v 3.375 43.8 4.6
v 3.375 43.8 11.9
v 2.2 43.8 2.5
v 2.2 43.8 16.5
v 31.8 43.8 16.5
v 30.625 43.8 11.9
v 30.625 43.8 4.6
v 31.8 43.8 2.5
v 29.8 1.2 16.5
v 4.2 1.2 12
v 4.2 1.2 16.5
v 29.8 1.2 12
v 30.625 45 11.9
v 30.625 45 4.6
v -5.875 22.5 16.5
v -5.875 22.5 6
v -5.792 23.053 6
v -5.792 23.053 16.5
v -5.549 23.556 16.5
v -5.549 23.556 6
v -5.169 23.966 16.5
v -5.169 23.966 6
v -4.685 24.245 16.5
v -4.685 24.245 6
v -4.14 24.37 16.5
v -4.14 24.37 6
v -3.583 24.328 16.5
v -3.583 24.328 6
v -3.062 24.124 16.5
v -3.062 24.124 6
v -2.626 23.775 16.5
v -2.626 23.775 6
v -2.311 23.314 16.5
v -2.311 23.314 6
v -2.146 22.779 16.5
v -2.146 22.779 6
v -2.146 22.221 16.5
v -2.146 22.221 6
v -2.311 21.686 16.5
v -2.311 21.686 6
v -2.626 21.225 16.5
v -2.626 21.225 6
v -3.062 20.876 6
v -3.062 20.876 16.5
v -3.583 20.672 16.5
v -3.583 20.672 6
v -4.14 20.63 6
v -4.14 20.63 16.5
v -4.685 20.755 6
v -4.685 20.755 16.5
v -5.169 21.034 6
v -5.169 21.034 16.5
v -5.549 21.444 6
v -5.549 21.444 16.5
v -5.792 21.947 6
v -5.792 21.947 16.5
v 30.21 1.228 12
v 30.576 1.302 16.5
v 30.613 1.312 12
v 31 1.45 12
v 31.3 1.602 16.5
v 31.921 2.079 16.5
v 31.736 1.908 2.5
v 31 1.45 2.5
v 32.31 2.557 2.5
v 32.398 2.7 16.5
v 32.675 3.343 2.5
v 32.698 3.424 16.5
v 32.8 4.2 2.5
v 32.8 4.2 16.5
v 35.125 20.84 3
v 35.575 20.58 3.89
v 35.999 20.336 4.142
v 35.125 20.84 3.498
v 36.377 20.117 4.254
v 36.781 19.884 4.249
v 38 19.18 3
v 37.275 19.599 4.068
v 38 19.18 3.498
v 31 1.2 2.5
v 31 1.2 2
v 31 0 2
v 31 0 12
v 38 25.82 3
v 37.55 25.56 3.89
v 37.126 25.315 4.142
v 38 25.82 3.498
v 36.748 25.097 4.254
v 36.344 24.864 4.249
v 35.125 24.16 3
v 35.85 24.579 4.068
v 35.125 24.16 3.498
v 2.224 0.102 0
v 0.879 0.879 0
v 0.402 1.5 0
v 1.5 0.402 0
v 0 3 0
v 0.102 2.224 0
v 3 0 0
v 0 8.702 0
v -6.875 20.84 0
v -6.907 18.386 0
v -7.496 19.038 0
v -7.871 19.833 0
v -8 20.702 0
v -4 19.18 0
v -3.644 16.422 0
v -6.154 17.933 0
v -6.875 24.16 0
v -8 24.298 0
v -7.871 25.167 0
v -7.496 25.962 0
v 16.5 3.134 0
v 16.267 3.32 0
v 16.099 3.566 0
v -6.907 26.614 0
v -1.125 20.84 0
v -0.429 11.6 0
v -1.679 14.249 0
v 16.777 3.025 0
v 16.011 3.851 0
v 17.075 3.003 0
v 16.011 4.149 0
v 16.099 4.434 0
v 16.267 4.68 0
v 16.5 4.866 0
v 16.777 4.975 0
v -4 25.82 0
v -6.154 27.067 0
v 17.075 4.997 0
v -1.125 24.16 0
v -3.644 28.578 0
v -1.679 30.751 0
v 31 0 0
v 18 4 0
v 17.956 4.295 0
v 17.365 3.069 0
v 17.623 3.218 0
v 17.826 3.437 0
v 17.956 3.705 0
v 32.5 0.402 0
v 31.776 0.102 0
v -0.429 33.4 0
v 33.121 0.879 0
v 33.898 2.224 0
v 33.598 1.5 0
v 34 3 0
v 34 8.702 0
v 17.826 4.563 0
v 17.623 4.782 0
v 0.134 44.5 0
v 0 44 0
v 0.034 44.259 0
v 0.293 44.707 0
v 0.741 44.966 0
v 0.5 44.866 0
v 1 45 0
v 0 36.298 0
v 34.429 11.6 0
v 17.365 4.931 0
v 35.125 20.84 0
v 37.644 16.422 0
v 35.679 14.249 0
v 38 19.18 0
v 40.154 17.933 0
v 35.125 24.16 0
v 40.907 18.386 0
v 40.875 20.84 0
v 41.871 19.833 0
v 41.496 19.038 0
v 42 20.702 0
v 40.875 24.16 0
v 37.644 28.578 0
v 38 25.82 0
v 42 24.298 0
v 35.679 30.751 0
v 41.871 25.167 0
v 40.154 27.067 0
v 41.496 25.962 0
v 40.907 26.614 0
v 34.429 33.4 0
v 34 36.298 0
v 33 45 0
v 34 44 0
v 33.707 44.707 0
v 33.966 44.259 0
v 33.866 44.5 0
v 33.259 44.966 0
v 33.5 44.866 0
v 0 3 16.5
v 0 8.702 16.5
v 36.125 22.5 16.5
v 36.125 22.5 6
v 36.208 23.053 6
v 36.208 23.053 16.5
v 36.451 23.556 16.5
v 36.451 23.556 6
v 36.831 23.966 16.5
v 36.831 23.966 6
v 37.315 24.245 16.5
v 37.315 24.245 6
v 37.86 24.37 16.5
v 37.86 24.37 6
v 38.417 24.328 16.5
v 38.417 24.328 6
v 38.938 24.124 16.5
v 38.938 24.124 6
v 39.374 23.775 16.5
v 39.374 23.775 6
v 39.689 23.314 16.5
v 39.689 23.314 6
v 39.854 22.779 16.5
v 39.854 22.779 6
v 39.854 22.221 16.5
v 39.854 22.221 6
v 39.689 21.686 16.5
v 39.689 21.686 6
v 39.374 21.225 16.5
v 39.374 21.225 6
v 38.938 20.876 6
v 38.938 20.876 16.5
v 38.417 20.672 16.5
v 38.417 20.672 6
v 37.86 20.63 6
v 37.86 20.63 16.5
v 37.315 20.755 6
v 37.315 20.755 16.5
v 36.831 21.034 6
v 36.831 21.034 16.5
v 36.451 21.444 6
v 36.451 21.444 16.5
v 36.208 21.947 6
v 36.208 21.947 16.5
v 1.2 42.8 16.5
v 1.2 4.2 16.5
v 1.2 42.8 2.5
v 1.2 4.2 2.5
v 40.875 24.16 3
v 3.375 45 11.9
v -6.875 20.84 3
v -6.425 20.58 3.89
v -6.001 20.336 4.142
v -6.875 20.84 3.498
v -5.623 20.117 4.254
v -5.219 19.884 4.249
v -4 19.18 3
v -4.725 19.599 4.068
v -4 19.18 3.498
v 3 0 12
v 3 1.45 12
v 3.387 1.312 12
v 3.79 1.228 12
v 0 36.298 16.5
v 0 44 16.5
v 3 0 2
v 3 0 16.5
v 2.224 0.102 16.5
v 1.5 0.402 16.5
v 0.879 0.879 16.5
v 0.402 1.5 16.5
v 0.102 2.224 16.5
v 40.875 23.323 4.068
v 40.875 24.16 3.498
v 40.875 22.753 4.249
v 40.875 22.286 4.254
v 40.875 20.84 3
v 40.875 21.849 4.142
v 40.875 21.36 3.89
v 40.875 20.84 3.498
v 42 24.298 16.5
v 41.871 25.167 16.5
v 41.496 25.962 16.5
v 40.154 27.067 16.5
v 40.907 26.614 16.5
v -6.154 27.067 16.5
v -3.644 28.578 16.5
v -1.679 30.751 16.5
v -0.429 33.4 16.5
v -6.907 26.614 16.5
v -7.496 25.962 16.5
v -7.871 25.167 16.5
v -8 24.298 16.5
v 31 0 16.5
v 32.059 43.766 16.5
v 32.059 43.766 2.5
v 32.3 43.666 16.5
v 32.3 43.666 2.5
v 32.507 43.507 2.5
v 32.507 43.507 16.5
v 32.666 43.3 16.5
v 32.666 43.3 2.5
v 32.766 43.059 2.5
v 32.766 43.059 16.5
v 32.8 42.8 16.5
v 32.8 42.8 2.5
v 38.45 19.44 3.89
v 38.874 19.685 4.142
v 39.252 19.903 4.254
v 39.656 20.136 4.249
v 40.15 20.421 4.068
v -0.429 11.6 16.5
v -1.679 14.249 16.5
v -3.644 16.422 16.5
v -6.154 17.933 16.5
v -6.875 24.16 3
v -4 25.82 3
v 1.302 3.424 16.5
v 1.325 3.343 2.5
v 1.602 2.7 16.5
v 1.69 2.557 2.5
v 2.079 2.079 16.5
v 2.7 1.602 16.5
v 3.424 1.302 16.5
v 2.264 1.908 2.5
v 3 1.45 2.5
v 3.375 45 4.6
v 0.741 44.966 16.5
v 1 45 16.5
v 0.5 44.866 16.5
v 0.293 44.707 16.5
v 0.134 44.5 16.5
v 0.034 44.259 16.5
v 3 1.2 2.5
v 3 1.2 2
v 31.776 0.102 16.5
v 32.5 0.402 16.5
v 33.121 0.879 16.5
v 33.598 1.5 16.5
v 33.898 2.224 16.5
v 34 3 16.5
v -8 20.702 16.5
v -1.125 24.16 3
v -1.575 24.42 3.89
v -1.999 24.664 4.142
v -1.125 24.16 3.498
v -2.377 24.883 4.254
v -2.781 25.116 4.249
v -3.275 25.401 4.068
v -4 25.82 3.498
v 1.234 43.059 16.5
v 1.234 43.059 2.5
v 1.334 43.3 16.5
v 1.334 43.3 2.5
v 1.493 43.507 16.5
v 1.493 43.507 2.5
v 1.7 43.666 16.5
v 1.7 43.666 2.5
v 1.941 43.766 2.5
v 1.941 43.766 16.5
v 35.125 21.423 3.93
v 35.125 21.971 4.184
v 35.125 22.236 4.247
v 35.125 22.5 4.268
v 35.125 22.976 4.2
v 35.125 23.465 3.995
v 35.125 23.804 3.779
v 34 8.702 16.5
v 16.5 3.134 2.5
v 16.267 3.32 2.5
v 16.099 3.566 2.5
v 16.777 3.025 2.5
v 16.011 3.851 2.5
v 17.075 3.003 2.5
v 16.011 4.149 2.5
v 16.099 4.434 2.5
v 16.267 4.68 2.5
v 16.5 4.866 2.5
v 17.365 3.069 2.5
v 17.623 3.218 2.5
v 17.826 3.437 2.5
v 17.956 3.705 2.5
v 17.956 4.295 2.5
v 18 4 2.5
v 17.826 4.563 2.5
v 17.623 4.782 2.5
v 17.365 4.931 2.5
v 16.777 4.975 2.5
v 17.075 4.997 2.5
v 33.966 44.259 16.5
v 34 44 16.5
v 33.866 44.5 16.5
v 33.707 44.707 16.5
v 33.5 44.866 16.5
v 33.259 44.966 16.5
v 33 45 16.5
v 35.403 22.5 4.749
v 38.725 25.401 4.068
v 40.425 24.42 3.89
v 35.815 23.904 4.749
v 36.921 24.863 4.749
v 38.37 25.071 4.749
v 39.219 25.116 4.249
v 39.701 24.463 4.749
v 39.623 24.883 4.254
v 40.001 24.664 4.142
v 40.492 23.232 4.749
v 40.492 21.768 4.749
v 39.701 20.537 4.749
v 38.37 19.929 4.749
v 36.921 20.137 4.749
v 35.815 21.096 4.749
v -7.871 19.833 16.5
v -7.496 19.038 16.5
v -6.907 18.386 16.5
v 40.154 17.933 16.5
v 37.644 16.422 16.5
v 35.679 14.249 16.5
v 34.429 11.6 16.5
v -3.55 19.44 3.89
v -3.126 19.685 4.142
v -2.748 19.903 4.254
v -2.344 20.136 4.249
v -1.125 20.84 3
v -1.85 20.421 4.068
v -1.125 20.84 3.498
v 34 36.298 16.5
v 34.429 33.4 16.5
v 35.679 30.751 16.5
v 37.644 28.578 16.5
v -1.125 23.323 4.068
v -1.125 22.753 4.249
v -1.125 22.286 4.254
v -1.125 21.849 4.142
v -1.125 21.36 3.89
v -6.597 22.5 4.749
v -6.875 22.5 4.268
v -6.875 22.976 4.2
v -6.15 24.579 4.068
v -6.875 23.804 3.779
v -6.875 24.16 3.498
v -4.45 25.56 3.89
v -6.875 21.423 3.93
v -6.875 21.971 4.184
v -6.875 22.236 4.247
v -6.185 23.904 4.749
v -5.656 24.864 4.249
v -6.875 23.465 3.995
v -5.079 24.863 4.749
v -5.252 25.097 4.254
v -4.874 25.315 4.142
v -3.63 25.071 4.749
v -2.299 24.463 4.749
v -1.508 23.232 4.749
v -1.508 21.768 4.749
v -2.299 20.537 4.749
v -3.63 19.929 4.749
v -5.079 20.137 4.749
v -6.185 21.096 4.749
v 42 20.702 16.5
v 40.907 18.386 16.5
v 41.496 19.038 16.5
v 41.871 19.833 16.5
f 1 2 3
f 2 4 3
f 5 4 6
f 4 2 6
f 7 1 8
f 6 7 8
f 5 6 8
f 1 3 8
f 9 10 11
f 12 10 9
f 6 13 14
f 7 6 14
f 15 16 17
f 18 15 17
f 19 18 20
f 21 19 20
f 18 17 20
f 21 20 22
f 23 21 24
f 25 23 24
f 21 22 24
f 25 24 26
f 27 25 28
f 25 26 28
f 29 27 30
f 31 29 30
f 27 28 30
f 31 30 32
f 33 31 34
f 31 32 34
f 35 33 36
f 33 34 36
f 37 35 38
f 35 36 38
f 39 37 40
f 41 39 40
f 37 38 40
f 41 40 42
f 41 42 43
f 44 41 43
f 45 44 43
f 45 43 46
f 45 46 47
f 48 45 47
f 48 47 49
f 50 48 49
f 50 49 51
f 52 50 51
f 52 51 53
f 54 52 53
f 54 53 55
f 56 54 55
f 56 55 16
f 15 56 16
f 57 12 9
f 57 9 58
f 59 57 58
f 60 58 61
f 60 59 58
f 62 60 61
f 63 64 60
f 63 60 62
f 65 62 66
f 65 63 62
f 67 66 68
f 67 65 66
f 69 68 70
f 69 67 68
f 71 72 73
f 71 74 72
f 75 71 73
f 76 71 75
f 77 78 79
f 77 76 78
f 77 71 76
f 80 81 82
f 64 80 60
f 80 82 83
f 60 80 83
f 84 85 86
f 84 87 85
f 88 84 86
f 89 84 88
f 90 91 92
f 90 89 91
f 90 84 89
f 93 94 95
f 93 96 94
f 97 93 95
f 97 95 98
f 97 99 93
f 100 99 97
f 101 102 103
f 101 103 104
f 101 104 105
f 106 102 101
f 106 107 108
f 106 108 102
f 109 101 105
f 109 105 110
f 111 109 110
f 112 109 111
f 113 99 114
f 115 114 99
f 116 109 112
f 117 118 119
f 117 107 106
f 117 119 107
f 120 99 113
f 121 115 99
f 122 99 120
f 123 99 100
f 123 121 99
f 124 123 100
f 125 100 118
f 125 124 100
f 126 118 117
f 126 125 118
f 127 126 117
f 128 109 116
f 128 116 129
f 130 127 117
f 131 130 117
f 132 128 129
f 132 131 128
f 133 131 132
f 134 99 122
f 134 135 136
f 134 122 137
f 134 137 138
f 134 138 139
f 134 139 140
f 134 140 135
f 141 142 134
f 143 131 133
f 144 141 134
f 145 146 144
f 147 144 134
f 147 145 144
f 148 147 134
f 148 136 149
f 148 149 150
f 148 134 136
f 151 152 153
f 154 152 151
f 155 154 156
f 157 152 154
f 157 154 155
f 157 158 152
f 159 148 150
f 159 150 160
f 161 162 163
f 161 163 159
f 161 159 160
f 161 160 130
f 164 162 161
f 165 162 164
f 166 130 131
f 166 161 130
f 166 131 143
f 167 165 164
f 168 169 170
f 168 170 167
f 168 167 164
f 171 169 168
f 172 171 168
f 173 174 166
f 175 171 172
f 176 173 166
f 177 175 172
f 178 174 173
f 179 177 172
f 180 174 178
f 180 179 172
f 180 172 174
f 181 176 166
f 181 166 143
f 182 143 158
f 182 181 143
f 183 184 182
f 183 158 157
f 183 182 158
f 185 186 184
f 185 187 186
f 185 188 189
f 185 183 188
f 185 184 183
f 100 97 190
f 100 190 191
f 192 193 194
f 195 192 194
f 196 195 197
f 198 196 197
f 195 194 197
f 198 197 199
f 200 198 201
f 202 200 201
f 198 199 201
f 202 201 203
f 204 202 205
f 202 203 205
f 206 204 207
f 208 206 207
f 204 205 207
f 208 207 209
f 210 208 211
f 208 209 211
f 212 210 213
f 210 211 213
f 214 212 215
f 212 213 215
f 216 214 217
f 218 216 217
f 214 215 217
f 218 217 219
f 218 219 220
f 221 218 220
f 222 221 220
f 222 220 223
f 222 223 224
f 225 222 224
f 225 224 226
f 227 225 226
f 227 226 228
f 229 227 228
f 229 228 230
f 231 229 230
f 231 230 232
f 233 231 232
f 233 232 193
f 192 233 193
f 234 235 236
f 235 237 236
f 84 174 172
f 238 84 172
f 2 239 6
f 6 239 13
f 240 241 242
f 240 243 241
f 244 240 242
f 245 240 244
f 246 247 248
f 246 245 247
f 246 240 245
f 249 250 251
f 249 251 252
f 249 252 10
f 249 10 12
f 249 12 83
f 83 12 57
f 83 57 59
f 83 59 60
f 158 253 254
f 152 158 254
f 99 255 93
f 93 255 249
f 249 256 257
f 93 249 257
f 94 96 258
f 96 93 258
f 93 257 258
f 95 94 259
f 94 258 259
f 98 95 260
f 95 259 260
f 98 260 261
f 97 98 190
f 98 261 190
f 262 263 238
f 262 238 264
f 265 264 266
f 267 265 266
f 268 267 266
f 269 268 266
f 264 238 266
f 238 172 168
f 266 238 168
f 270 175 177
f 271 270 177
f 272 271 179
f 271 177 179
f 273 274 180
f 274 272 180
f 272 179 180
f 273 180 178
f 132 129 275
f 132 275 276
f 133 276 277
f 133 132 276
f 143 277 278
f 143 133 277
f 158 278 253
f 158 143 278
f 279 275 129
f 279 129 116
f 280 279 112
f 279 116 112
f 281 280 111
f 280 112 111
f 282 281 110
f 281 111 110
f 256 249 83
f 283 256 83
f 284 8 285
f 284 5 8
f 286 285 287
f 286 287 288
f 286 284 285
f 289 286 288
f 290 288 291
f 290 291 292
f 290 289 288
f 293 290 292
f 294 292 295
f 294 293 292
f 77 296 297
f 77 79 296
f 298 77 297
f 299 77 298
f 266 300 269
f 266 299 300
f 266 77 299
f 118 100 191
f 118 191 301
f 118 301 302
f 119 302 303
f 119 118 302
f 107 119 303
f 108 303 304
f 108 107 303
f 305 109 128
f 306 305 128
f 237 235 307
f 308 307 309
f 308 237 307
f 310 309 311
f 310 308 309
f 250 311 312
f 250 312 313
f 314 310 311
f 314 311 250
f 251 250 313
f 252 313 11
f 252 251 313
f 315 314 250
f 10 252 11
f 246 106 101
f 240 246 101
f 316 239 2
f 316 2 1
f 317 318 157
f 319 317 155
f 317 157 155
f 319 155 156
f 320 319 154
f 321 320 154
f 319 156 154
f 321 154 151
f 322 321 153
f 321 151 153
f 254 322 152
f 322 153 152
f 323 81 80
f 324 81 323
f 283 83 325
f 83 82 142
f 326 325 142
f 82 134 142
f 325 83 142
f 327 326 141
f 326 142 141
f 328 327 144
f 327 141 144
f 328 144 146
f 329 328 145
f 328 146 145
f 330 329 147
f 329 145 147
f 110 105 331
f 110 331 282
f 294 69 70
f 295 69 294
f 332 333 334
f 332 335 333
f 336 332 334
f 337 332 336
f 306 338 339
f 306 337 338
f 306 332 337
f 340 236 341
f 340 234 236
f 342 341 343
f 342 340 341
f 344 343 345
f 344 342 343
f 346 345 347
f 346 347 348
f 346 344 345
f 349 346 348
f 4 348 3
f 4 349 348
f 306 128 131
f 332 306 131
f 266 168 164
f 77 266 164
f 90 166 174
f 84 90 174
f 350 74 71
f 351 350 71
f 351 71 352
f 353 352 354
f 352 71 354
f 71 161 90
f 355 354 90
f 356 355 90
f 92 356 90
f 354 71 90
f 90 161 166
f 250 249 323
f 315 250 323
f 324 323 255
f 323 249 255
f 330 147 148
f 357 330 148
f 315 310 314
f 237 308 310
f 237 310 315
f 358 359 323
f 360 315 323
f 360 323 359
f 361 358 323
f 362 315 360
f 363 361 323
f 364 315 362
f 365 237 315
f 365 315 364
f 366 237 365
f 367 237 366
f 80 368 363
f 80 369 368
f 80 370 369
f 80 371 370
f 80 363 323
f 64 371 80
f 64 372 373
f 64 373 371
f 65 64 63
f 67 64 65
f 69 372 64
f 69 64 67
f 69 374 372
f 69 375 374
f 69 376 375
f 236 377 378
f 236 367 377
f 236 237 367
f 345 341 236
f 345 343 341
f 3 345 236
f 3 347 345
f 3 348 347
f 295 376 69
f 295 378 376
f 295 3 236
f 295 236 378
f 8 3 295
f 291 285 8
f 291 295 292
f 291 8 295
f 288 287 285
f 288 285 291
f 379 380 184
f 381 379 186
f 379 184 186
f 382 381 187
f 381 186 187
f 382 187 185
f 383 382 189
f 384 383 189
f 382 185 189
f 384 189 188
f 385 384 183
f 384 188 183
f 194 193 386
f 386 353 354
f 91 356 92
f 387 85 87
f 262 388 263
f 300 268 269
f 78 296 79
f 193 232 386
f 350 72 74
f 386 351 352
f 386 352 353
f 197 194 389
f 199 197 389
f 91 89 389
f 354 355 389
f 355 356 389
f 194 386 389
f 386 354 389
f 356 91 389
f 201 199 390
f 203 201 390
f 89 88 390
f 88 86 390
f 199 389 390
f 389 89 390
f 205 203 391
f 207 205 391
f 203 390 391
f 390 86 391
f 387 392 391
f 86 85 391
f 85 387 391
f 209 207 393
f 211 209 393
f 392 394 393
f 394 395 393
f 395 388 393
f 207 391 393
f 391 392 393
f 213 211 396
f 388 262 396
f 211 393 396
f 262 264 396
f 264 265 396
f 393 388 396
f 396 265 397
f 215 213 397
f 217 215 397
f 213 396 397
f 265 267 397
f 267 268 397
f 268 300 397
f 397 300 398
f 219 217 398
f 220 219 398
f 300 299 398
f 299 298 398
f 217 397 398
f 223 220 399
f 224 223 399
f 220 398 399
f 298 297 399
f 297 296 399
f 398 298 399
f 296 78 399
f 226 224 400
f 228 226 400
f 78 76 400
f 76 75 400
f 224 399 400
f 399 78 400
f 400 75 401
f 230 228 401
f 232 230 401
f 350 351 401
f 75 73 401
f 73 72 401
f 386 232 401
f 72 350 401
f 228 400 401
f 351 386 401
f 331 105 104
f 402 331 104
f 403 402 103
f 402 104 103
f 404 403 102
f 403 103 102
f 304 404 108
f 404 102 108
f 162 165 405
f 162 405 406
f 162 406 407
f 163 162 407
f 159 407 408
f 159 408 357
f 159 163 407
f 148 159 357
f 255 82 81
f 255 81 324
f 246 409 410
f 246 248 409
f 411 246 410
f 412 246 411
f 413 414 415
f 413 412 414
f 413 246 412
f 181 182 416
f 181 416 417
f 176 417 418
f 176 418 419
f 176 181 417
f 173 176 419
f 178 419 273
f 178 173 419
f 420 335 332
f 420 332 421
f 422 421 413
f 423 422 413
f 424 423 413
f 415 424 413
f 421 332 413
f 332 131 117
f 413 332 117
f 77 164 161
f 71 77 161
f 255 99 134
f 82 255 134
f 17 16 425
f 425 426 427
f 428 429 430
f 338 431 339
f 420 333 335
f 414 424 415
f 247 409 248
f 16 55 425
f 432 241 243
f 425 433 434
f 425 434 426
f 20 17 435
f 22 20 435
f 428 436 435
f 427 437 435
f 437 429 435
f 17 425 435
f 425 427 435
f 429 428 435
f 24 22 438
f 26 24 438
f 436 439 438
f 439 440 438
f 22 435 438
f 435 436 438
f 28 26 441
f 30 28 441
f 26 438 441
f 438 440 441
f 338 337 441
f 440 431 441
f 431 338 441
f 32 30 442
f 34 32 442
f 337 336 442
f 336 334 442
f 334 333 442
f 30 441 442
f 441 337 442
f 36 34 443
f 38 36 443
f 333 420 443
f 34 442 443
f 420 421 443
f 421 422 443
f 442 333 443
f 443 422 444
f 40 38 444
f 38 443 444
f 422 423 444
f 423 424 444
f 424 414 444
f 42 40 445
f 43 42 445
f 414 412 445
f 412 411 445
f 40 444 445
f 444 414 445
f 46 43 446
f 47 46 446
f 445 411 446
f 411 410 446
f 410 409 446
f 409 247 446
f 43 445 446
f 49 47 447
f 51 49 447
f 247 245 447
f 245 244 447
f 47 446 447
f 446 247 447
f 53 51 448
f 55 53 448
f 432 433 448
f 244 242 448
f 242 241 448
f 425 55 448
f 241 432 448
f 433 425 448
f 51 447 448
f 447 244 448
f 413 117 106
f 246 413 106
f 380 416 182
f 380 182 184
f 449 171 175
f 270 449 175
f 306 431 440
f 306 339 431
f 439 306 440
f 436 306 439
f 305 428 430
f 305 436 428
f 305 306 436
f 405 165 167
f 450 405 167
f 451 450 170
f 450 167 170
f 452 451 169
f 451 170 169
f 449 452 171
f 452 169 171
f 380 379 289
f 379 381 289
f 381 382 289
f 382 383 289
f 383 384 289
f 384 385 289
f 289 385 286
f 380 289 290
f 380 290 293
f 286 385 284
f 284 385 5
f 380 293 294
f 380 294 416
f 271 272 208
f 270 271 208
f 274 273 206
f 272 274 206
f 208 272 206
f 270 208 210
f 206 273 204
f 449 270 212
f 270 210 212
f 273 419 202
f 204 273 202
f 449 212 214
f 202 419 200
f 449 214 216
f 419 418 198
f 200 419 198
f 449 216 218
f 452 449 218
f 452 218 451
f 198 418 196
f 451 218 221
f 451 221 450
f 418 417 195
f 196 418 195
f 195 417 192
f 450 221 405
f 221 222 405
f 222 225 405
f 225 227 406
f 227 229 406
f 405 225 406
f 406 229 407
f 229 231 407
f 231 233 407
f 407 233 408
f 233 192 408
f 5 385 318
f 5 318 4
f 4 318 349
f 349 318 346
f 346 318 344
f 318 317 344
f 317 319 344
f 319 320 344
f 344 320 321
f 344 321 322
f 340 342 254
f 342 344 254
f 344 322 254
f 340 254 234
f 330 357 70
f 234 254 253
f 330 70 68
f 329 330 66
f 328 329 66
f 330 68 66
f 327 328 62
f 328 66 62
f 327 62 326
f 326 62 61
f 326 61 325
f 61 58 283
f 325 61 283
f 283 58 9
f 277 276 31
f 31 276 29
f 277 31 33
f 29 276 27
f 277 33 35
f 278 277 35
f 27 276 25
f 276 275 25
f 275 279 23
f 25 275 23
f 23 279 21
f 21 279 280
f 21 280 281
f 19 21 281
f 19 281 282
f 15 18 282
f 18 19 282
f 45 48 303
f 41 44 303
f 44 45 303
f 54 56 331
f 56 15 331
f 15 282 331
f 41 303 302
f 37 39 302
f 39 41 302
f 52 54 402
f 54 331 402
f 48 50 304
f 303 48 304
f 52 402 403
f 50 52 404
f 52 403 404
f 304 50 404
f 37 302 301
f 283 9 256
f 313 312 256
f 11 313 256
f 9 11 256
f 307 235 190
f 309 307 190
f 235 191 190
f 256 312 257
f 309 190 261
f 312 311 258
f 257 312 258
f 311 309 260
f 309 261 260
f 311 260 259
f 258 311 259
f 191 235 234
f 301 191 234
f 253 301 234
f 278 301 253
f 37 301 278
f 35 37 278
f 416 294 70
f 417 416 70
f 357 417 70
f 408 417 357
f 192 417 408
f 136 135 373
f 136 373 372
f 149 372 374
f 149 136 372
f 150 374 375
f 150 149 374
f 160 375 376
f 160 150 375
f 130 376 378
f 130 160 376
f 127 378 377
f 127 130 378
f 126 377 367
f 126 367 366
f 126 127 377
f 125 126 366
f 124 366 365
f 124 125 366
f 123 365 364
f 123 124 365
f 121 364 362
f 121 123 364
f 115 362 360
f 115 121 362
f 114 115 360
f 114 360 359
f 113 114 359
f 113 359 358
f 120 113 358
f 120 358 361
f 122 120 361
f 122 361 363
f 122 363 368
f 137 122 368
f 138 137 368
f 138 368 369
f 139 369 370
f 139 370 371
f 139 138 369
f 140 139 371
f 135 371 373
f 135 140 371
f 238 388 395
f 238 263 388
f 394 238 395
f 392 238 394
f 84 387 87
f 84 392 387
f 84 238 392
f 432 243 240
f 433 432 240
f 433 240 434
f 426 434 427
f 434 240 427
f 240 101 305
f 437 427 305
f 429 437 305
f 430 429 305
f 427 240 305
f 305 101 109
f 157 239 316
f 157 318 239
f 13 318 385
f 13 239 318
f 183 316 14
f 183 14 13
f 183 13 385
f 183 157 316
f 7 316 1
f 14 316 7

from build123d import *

# Parameters (mm, degrees)
SKETCH1_W           = 34
SKETCH1_H           = 45
SKETCH1_R           = 1
BOSS_EXTRUDE1_DEPTH = 2.5
SKETCH2_W           = 34
SKETCH2_H           = 45
SKETCH2_W_2         = 31.6
SKETCH2_H_2         = 42.6
BOSS_EXTRUDE2_DEPTH = 14
SKETCH7_W           = 28
SKETCH7_H           = 10
CUT_EXTRUDE2_DEPTH  = 1.2
CUT_EXTRUDE3_REACH  = 60.764
SKETCH9_W           = 27.25
SKETCH9_H           = 7.3
SKETCH10_W          = 8
SKETCH10_H          = 8
SKETCH10_R          = 1.875
BOSS_EXTRUDE3_DEPTH = 16.5
FILLET1_R           = 10
FILLET2_R           = 3
FILLET3_R           = 1
CUT_EXTRUDE4_DEPTH  = 3
CHAMFER1_SIZE       = 3
CHAMFER1_SIZE_2     = 1.732050808


with BuildPart() as part:
    # Sketch1 → Boss-Extrude1 (new body)
    with BuildSketch(Plane.XY):
        with Locations((17, 22.5)):
            Rectangle(SKETCH1_W, SKETCH1_H)
        with Locations((17, 4)):
            Circle(SKETCH1_R, mode=Mode.SUBTRACT)
    extrude(amount=BOSS_EXTRUDE1_DEPTH)

    # Sketch2 → Boss-Extrude2 (add)
    with BuildSketch(Plane.XY.offset(2.5)):
        with Locations((17, 22.5)):
            Rectangle(SKETCH2_W, SKETCH2_H)
        with Locations((17, 22.5)):
            Rectangle(SKETCH2_W_2, SKETCH2_H_2, mode=Mode.SUBTRACT)
    extrude(amount=BOSS_EXTRUDE2_DEPTH)

    # Sketch7 → Cut-Extrude2 (cut)
    with BuildSketch(Plane(origin=(0, 0, 0), x_dir=(-1, 0, 0), z_dir=(0, -1, 0))):
        with Locations((-17, -7)):
            Rectangle(SKETCH7_W, SKETCH7_H)
    extrude(amount=-CUT_EXTRUDE2_DEPTH, mode=Mode.SUBTRACT)

    # Sketch9 → Cut-Extrude3 (cut, up to next)
    with BuildSketch(Plane(origin=(0, 45, 0), x_dir=(1, 0, 0), z_dir=(0, 1, 0)), mode=Mode.PRIVATE) as cut_extrude3_sk1:
        with Locations((17, -8.25)):
            Rectangle(SKETCH9_W, SKETCH9_H)
    cut_extrude3_tool1 = extrude(cut_extrude3_sk1.sketch, amount=-CUT_EXTRUDE3_REACH, mode=Mode.PRIVATE) & part.part
    add(cut_extrude3_tool1.solids().sort_by_distance((17, 45, 8.25))[0], mode=Mode.SUBTRACT)

    # Sketch10 → Boss-Extrude3 (add)
    # profile 1 of 2: a face of its own
    with BuildSketch(Plane(origin=(0, 0, 0), x_dir=(-1, 0, 0), z_dir=(0, 0, -1))):
        with Locations((-38, 22.5)):
            Rectangle(SKETCH10_W, SKETCH10_H)
        with Locations((-38, 22.5)):
            Circle(SKETCH10_R, mode=Mode.SUBTRACT)
    # profile 2 of 2: a face of its own
    with BuildSketch(Plane(origin=(0, 0, 0), x_dir=(-1, 0, 0), z_dir=(0, 0, -1))):
        with Locations((4, 22.5)):
            Rectangle(SKETCH10_W, SKETCH10_H)
        with Locations((4, 22.5)):
            Circle(SKETCH10_R, mode=Mode.SUBTRACT)
    extrude(amount=-BOSS_EXTRUDE3_DEPTH)

    # Fillet1
    # the kernel refuses this fillet: 10 mm, written as the material it adds along each edge
    with BuildSketch(Plane(origin=(34, 26.5, 0), x_dir=(0, 1, 0), z_dir=(0, 0, 1)), Plane(origin=(0, 18.5, 0), x_dir=(0, -1, 0), z_dir=(0, 0, 1))) as fillet1_piece_1:
        with BuildLine():
            CenterArc((9.797958971, -10), FILLET1_R, 90, 78.463040967)
            Line((0, -8), (-0.195959179, -7.96))
            ThreePointArc((-0.195959179, -7.96), (-0.2, -4), (-0.2, 0))
            Line((-0.2, 0), (0, 0.2))
            Line((0, 0.2), (9.797958971, 0.2))
            Line((9.797958971, 0.2), (9.797958971, 0))
        make_face()
    extrude(amount=16.5)
    with BuildSketch(Plane(origin=(34, 18.5, 0), x_dir=(0, -1, 0), z_dir=(0, 0, 1)), Plane(origin=(0, 26.5, 0), x_dir=(0, 1, 0), z_dir=(0, 0, 1))) as fillet1_piece_2:
        with BuildLine():
            CenterArc((9.797958971, 10), FILLET1_R, 191.536959033, 78.463040967)
            Line((0, 8), (-0.195959179, 7.96))
            ThreePointArc((-0.195959179, 7.96), (-0.2, 4), (-0.2, 0))
            Line((-0.2, 0), (0, -0.2))
            Line((0, -0.2), (9.797958971, -0.2))
            Line((9.797958971, -0.2), (9.797958971, 0))
        make_face()
    extrude(amount=16.5)

    # Fillet2
    # the kernel refuses this fillet: 3 mm, written as the material it adds along each edge
    with BuildSketch(Plane(origin=(32.8, 1.2, 2.5), x_dir=(-1, 0, 0), z_dir=(0, 0, 1))) as fillet2_piece_1_section:
        with BuildLine():
            CenterArc((FILLET2_R, -FILLET2_R), FILLET2_R, 90, 90)
            Line((0, -FILLET2_R), (0, 0))
            Line((0, 0), (FILLET2_R, 0))
        make_face()
    fillet2_piece_1 = extrude(amount=14, mode=Mode.PRIVATE)
    fillet2_piece_1 = split(fillet2_piece_1, bisect_by=Plane(origin=(31, 1.931235527, 7.25), z_dir=(1, 0, 0)), keep=Keep.TOP, mode=Mode.PRIVATE)
    fillet2_piece_1 = split(fillet2_piece_1, bisect_by=Plane(origin=(32.244849809, 1.931235527, 12), z_dir=(0, 0, -1)), keep=Keep.TOP, mode=Mode.PRIVATE)
    add(fillet2_piece_1)
    with BuildSketch(Plane(origin=(32.8, 1.2, 2.5), x_dir=(-1, 0, 0), z_dir=(0, 0, 1))) as fillet2_piece_2_section:
        with BuildLine():
            CenterArc((FILLET2_R, -FILLET2_R), FILLET2_R, 90, 90)
            Line((0, -FILLET2_R), (0, 0))
            Line((0, 0), (FILLET2_R, 0))
        make_face()
    fillet2_piece_2 = extrude(amount=14, mode=Mode.PRIVATE)
    fillet2_piece_2 = split(fillet2_piece_2, bisect_by=Plane(origin=(31, 1.230395544, 14.25), z_dir=(-1, 0, 0)), keep=Keep.TOP, mode=Mode.PRIVATE)
    fillet2_piece_2 = split(fillet2_piece_2, bisect_by=Plane(origin=(30.574754002, 1.230395544, 12), z_dir=(0, 0, 1)), keep=Keep.TOP, mode=Mode.PRIVATE)
    add(fillet2_piece_2)
    with BuildSketch(Plane(origin=(32.8, 1.2, 2.5), x_dir=(-1, 0, 0), z_dir=(0, 0, 1))) as fillet2_piece_3_section:
        with BuildLine():
            CenterArc((FILLET2_R, -FILLET2_R), FILLET2_R, 90, 90)
            Line((0, -FILLET2_R), (0, 0))
            Line((0, 0), (FILLET2_R, 0))
        make_face()
    fillet2_piece_3 = extrude(amount=14, mode=Mode.PRIVATE)
    fillet2_piece_3 = split(fillet2_piece_3, bisect_by=Plane(origin=(31, 1.931235527, 14.25), z_dir=(1, 0, 0)), keep=Keep.TOP, mode=Mode.PRIVATE)
    fillet2_piece_3 = split(fillet2_piece_3, bisect_by=Plane(origin=(32.244849809, 1.931235527, 12), z_dir=(0, 0, 1)), keep=Keep.TOP, mode=Mode.PRIVATE)
    add(fillet2_piece_3)
    with BuildSketch(Plane(origin=(1.2, 1.2, 2.5), x_dir=(0, 1, 0), z_dir=(0, 0, 1))) as fillet2_piece_4_section:
        with BuildLine():
            CenterArc((FILLET2_R, -FILLET2_R), FILLET2_R, 90, 90)
            Line((0, -FILLET2_R), (0, 0))
            Line((0, 0), (FILLET2_R, 0))
        make_face()
    fillet2_piece_4 = extrude(amount=14, mode=Mode.PRIVATE)
    fillet2_piece_4 = split(fillet2_piece_4, bisect_by=Plane(origin=(1.755150191, 1.931235527, 12), z_dir=(0, 0, -1)), keep=Keep.TOP, mode=Mode.PRIVATE)
    fillet2_piece_4 = split(fillet2_piece_4, bisect_by=Plane(origin=(3, 1.931235527, 7.25), z_dir=(-1, 0, 0)), keep=Keep.TOP, mode=Mode.PRIVATE)
    add(fillet2_piece_4)
    with BuildSketch(Plane(origin=(1.2, 1.2, 2.5), x_dir=(0, 1, 0), z_dir=(0, 0, 1))) as fillet2_piece_5_section:
        with BuildLine():
            CenterArc((FILLET2_R, -FILLET2_R), FILLET2_R, 90, 90)
            Line((0, -FILLET2_R), (0, 0))
            Line((0, 0), (FILLET2_R, 0))
        make_face()
    fillet2_piece_5 = extrude(amount=14, mode=Mode.PRIVATE)
    fillet2_piece_5 = split(fillet2_piece_5, bisect_by=Plane(origin=(1.755150191, 1.931235527, 12), z_dir=(0, 0, 1)), keep=Keep.TOP, mode=Mode.PRIVATE)
    fillet2_piece_5 = split(fillet2_piece_5, bisect_by=Plane(origin=(3, 1.931235527, 14.25), z_dir=(-1, 0, 0)), keep=Keep.TOP, mode=Mode.PRIVATE)
    add(fillet2_piece_5)
    with BuildSketch(Plane(origin=(1.2, 1.2, 2.5), x_dir=(0, 1, 0), z_dir=(0, 0, 1))) as fillet2_piece_6_section:
        with BuildLine():
            CenterArc((FILLET2_R, -FILLET2_R), FILLET2_R, 90, 90)
            Line((0, -FILLET2_R), (0, 0))
            Line((0, 0), (FILLET2_R, 0))
        make_face()
    fillet2_piece_6 = extrude(amount=14, mode=Mode.PRIVATE)
    fillet2_piece_6 = split(fillet2_piece_6, bisect_by=Plane(origin=(3.425245998, 1.230395544, 12), z_dir=(0, 0, 1)), keep=Keep.TOP, mode=Mode.PRIVATE)
    fillet2_piece_6 = split(fillet2_piece_6, bisect_by=Plane(origin=(3, 1.230395544, 14.25), z_dir=(1, 0, 0)), keep=Keep.TOP, mode=Mode.PRIVATE)
    add(fillet2_piece_6)
    # the kernel refuses this fillet: 3 mm, written as the material it takes off along each edge
    with BuildSketch(Plane(origin=(34, 0, -7.5), x_dir=(-1, 0, 0), z_dir=(0, 0, 1))) as fillet2_2_piece_1:
        with BuildLine():
            CenterArc((FILLET2_R, -FILLET2_R), FILLET2_R, 90, 90)
            Line((0, -FILLET2_R), (0, 0))
            Line((0, 0), (FILLET2_R, 0))
        make_face()
    extrude(amount=31.5, mode=Mode.SUBTRACT)
    with BuildSketch(Plane(origin=(0, 0, 24), x_dir=(0, 1, 0), z_dir=(0, 0, -1))) as fillet2_2_piece_2:
        with BuildLine():
            CenterArc((FILLET2_R, FILLET2_R), FILLET2_R, 180, 90)
            Line((0, FILLET2_R), (0, 0))
            Line((0, 0), (FILLET2_R, 0))
        make_face()
    extrude(amount=31.5, mode=Mode.SUBTRACT)
    with BuildSketch(Plane(origin=(42, 26.5, -5.505102572), x_dir=(-0.9559037360078775, 0.2936801789126771, 0), z_dir=(0, 0, 1))) as fillet2_2_piece_3:
        with BuildLine():
            CenterArc((2.221015405, 2.985979783), FILLET2_R, 197.07841199, 67.380135052)
            Line((-0.646695803, 2.104939246), (0, 0))
            ThreePointArc((0, 0), (0.965658872, 0.046734056), (1.931317743, 0))
        make_face()
    extrude(amount=27.510205144, mode=Mode.SUBTRACT)
    with BuildSketch(Plane(origin=(42, 18.5, -5.505102572), x_dir=(-0.9559037360078775, -0.2936801789126771, 0), z_dir=(0, 0, 1)), Plane(origin=(-8, 26.5, -5.505102572), x_dir=(0.9559037360078771, 0.29368017891267806, 0), z_dir=(0, 0, 1))) as fillet2_2_piece_4:
        with BuildLine():
            CenterArc((2.221015405, -2.985979783), FILLET2_R, 95.541452958, 67.380135052)
            Line((-0.646695803, -2.104939246), (0, 0))
            ThreePointArc((0, 0), (0.965658872, -0.046734056), (1.931317743, 0))
        make_face()
    extrude(amount=27.510205144, mode=Mode.SUBTRACT)
    with BuildSketch(Plane(origin=(-8, 18.5, -5.505102572), x_dir=(0, 1, 0), z_dir=(0, 0, 1))) as fillet2_2_piece_5:
        with BuildLine():
            CenterArc((2.202041029, -3), FILLET2_R, 90, 67.380135052)
            ThreePointArc((-0.56718974, -1.846153846), (-0.238921611, -0.936801789), (0, 0))
            Line((0, 0), (2.202041029, 0))
        make_face()
    extrude(amount=27.510205144, mode=Mode.SUBTRACT)

    # Fillet3
    fillet3_edges = [part.edges().sort_by_distance(p)[0] for p in [
        (32.8, 43.8, 9.5),
        (1.2, 43.8, 9.5),
        (34, 45, 8.25),
        (0, 45, 8.25),
    ]]
    fillet(fillet3_edges, radius=FILLET3_R)

    # Sketch11 → Cut-Extrude4 (cut)
    with BuildSketch(Plane(origin=(0, 0, 0), x_dir=(-1, 0, 0), z_dir=(0, 0, -1))):
        Polygon((-38, 19.180235952), (-35.125, 20.840117976), (-35.125, 24.159882024), (-38, 25.819764048), (-40.875, 24.159882024), (-40.875, 20.840117976), align=None)
        Polygon((4, 19.180235952), (6.875, 20.840117976), (6.875, 24.159882024), (4, 25.819764048), (1.125, 24.159882024), (1.125, 20.840117976), align=None)
    extrude(amount=-CUT_EXTRUDE4_DEPTH, mode=Mode.SUBTRACT)

    # Chamfer1
    # the kernel refuses this chamfer: 3, 1.732050808 mm, written as the material it takes off along each edge
    with BuildSketch(Plane(origin=(-4, 22.5, 3), x_dir=(-1, 0, 0), z_dir=(0, -1, 0))) as chamfer1_piece_1_section:
        Polygon((1.875, -CHAMFER1_SIZE), (1.875 + CHAMFER1_SIZE_2, 0), (1.875, 0), align=None)
    chamfer1_piece_1 = revolve(axis=Axis((-4, 22.5, 3), (0, 0, -1)), mode=Mode.PRIVATE)
    chamfer1_piece_1 = split(chamfer1_piece_1, bisect_by=Plane(origin=(-3.533643531, 18.910984919, 4.784069844), z_dir=(0.5000000000000003, 0.8660254037844387, 0)), keep=Keep.TOP, mode=Mode.PRIVATE)
    chamfer1_piece_1 = split(chamfer1_piece_1, bisect_by=Plane(origin=(-6.875, 22.5, 4.784069844), z_dir=(1, 0, 0)), keep=Keep.TOP, mode=Mode.PRIVATE)
    chamfer1_piece_1 = split(chamfer1_piece_1, bisect_by=Plane(origin=(-3.533643531, 26.089015081, 4.784069844), z_dir=(0.4999999999999998, -0.8660254037844388, 0)), keep=Keep.TOP, mode=Mode.PRIVATE)
    chamfer1_piece_1 = split(chamfer1_piece_1, bisect_by=Plane(origin=(-0.658643531, 23.890630991, 4.784069844), z_dir=(-0.5000000000000004, -0.8660254037844385, 0)), keep=Keep.TOP, mode=Mode.PRIVATE)
    chamfer1_piece_1 = split(chamfer1_piece_1, bisect_by=Plane(origin=(-1.125, 22.5, 4.784069844), z_dir=(-1, 0, 0)), keep=Keep.TOP, mode=Mode.PRIVATE)
    chamfer1_piece_1 = split(chamfer1_piece_1, bisect_by=Plane(origin=(-0.658643531, 21.109369009, 4.784069844), z_dir=(-0.5000000000000008, 0.8660254037844383, 0)), keep=Keep.TOP, mode=Mode.PRIVATE)
    add(chamfer1_piece_1, mode=Mode.SUBTRACT)
    with BuildSketch(Plane(origin=(38, 22.5, 3), x_dir=(-1, 0, 0), z_dir=(0, -1, 0))) as chamfer1_piece_2_section:
        Polygon((1.875, -CHAMFER1_SIZE), (1.875 + CHAMFER1_SIZE_2, 0), (1.875, 0), align=None)
    chamfer1_piece_2 = revolve(axis=Axis((38, 22.5, 3), (0, 0, -1)), mode=Mode.PRIVATE)
    chamfer1_piece_2 = split(chamfer1_piece_2, bisect_by=Plane(origin=(38.466356469, 18.910984919, 4.784069844), z_dir=(0.5000000000000004, 0.8660254037844385, 0)), keep=Keep.TOP, mode=Mode.PRIVATE)
    chamfer1_piece_2 = split(chamfer1_piece_2, bisect_by=Plane(origin=(35.125, 22.5, 4.784069844), z_dir=(1, 0, 0)), keep=Keep.TOP, mode=Mode.PRIVATE)
    chamfer1_piece_2 = split(chamfer1_piece_2, bisect_by=Plane(origin=(38.466356469, 26.089015081, 4.784069844), z_dir=(0.4999999999999988, -0.8660254037844394, 0)), keep=Keep.TOP, mode=Mode.PRIVATE)
    chamfer1_piece_2 = split(chamfer1_piece_2, bisect_by=Plane(origin=(41.341356469, 23.890630991, 4.784069844), z_dir=(-0.5000000000000002, -0.8660254037844386, 0)), keep=Keep.TOP, mode=Mode.PRIVATE)
    chamfer1_piece_2 = split(chamfer1_piece_2, bisect_by=Plane(origin=(40.875, 22.5, 4.784069844), z_dir=(-1, 0, 0)), keep=Keep.TOP, mode=Mode.PRIVATE)
    chamfer1_piece_2 = split(chamfer1_piece_2, bisect_by=Plane(origin=(41.341356469, 21.109369009, 4.784069844), z_dir=(-0.4999999999999996, 0.8660254037844389, 0)), keep=Keep.TOP, mode=Mode.PRIVATE)
    add(chamfer1_piece_2, mode=Mode.SUBTRACT)


solid = part.part
